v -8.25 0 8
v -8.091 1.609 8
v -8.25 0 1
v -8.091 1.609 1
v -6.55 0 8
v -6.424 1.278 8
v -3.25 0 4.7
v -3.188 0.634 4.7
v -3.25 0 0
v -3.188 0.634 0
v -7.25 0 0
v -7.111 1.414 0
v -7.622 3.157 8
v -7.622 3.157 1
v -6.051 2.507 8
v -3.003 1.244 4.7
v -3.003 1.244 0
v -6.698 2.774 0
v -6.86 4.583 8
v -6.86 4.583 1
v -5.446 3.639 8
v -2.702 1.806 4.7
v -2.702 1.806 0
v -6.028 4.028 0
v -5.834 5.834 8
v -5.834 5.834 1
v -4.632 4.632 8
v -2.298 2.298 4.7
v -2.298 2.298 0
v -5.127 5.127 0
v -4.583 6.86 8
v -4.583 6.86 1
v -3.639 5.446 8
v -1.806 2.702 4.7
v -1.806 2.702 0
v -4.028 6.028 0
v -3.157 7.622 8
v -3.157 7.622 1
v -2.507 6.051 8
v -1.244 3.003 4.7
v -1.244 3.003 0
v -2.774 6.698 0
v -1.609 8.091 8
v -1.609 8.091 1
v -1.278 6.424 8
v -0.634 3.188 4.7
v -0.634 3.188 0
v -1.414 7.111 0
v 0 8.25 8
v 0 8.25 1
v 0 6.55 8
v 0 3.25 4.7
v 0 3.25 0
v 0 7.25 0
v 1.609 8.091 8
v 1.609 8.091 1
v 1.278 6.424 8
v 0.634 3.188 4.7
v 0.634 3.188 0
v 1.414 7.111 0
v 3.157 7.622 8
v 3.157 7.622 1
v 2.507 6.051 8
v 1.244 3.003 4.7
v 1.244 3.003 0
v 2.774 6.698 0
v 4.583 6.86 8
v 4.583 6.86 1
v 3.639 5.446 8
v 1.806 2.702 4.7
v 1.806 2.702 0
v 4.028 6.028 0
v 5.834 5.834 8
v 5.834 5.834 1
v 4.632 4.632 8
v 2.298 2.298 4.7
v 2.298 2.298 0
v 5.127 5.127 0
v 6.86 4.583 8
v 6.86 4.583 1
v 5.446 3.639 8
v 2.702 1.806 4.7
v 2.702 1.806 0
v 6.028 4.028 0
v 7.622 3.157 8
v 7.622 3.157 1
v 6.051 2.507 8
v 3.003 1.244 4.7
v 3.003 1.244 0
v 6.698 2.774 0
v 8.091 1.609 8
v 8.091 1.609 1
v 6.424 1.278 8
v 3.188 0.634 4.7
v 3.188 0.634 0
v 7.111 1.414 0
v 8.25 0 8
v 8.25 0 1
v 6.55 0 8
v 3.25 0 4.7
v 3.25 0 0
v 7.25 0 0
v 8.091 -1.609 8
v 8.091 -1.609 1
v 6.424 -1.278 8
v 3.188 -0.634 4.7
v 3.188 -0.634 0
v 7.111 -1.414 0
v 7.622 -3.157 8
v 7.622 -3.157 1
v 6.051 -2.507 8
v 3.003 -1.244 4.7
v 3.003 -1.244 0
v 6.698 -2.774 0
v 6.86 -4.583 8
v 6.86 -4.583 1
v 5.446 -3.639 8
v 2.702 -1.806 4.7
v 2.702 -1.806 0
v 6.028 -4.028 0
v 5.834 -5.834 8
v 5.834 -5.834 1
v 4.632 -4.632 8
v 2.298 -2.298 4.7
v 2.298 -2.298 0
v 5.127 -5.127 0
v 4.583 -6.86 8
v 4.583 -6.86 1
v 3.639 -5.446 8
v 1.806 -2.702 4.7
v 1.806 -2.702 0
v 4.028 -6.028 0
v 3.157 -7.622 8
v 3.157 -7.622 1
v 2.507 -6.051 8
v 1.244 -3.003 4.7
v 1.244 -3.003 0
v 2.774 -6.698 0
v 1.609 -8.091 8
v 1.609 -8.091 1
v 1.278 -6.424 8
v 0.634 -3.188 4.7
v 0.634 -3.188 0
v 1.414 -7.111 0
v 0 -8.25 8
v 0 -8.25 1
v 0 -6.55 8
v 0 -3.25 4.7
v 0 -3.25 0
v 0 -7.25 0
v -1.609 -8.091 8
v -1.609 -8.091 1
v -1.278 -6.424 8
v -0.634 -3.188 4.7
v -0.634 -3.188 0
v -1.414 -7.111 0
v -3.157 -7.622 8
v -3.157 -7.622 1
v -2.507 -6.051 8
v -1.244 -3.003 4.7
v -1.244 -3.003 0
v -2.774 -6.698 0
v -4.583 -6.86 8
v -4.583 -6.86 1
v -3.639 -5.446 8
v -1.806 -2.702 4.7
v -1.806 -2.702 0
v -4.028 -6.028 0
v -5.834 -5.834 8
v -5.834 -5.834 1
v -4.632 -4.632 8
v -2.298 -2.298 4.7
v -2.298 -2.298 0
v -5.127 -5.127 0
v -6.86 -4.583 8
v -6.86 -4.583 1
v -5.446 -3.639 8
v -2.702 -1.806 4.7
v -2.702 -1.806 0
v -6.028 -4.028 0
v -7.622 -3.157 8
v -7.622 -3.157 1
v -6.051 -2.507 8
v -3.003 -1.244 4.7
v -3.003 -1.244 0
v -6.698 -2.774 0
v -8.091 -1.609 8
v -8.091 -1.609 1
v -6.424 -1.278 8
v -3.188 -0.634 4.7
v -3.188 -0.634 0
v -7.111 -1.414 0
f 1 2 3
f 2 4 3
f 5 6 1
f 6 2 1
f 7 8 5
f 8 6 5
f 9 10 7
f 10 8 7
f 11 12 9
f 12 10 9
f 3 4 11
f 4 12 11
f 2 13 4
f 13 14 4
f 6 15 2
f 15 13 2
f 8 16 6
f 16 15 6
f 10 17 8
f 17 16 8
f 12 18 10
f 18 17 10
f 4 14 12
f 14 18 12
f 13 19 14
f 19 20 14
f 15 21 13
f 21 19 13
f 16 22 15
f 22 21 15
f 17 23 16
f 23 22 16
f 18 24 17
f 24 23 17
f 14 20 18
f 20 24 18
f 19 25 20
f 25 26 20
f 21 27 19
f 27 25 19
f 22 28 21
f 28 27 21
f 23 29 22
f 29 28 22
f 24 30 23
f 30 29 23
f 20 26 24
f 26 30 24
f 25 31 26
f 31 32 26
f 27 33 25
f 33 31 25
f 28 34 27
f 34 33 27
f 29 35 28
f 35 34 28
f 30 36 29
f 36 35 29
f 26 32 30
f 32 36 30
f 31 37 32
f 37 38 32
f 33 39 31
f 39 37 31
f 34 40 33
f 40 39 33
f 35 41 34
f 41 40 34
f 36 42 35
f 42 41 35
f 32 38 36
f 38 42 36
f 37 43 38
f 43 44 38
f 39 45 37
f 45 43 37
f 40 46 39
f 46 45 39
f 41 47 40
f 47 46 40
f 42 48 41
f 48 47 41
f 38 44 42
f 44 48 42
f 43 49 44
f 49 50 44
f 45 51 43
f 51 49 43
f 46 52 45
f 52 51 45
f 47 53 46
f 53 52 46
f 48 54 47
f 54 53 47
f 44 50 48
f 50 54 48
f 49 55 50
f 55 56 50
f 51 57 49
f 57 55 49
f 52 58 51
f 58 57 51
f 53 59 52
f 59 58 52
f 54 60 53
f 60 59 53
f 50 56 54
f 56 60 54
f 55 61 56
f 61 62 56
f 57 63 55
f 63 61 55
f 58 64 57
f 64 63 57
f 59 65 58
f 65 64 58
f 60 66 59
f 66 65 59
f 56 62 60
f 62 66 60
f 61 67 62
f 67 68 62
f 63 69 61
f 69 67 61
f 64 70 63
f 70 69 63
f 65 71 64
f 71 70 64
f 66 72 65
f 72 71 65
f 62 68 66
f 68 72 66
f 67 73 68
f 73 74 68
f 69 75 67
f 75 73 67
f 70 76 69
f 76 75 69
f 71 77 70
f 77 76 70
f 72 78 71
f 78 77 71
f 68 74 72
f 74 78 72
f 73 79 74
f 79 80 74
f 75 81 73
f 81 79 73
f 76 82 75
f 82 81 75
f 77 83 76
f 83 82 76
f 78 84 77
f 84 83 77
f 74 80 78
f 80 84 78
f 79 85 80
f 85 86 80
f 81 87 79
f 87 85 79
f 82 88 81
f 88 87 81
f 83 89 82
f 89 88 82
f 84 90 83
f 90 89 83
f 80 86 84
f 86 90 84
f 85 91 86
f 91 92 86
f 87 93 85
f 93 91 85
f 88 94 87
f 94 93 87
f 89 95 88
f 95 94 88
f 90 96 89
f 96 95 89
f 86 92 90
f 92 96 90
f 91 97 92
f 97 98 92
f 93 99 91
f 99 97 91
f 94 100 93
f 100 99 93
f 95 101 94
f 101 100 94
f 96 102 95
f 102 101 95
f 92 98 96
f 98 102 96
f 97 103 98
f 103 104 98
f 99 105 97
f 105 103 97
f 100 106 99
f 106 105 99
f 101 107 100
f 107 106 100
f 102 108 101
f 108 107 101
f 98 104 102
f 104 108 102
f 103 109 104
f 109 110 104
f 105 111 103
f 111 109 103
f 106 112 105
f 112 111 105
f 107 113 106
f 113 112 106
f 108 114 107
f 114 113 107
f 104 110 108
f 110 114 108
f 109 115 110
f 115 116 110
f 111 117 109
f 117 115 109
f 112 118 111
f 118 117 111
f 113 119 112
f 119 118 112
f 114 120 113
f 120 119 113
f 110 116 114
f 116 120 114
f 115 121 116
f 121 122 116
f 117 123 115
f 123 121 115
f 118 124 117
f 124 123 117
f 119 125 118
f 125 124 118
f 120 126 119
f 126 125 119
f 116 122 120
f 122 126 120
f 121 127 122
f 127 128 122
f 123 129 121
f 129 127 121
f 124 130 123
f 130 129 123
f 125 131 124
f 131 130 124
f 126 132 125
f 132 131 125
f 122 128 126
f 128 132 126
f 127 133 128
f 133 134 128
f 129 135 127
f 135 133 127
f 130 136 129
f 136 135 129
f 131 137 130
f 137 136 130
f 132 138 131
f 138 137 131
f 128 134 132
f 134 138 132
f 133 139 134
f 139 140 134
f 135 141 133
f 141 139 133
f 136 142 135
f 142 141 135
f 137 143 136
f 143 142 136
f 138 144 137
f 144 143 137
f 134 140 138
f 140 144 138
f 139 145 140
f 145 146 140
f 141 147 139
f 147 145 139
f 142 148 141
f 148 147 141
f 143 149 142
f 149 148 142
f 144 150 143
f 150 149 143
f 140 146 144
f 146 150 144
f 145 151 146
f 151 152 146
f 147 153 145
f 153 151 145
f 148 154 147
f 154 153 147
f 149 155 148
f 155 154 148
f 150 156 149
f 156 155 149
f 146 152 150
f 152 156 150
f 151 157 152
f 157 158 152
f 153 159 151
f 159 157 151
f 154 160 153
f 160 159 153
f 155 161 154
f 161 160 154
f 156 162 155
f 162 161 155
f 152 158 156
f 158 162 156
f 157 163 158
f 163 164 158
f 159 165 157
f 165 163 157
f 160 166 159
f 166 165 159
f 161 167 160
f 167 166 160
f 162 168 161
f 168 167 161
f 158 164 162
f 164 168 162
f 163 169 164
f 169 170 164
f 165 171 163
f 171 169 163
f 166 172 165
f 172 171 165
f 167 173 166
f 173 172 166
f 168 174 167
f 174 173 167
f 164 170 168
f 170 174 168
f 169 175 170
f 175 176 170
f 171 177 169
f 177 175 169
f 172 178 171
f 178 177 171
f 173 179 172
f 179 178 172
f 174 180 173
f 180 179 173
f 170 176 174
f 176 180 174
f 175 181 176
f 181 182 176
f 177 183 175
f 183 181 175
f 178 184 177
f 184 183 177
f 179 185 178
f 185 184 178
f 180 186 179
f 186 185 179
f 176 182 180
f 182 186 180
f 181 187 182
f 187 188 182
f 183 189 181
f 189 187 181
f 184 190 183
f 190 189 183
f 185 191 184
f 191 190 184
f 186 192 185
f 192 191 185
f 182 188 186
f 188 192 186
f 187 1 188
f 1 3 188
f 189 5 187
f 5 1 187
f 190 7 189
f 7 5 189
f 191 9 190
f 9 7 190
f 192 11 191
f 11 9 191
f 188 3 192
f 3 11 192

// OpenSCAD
$fn = 32;

// ----------------------------------------------------------------------
// Form washer: countersunk washer, 16.5 mm outside, 6.5 mm bore
// ----------------------------------------------------------------------

// --- parameters (mm) ---
revolve_angle = 360;      // full turn around the Z axis
profile_points = 6;       // points of the closed outline

profile = [[3.25, 0], [7.25, 0], [8.25, 1], [8.25, 8], [6.55, 8], [3.25, 4.7]];  // single closed polygon, 6 points, counter clockwise

// --- the one profile operation ---
rotate_extrude(angle = revolve_angle) polygon(points = profile);
